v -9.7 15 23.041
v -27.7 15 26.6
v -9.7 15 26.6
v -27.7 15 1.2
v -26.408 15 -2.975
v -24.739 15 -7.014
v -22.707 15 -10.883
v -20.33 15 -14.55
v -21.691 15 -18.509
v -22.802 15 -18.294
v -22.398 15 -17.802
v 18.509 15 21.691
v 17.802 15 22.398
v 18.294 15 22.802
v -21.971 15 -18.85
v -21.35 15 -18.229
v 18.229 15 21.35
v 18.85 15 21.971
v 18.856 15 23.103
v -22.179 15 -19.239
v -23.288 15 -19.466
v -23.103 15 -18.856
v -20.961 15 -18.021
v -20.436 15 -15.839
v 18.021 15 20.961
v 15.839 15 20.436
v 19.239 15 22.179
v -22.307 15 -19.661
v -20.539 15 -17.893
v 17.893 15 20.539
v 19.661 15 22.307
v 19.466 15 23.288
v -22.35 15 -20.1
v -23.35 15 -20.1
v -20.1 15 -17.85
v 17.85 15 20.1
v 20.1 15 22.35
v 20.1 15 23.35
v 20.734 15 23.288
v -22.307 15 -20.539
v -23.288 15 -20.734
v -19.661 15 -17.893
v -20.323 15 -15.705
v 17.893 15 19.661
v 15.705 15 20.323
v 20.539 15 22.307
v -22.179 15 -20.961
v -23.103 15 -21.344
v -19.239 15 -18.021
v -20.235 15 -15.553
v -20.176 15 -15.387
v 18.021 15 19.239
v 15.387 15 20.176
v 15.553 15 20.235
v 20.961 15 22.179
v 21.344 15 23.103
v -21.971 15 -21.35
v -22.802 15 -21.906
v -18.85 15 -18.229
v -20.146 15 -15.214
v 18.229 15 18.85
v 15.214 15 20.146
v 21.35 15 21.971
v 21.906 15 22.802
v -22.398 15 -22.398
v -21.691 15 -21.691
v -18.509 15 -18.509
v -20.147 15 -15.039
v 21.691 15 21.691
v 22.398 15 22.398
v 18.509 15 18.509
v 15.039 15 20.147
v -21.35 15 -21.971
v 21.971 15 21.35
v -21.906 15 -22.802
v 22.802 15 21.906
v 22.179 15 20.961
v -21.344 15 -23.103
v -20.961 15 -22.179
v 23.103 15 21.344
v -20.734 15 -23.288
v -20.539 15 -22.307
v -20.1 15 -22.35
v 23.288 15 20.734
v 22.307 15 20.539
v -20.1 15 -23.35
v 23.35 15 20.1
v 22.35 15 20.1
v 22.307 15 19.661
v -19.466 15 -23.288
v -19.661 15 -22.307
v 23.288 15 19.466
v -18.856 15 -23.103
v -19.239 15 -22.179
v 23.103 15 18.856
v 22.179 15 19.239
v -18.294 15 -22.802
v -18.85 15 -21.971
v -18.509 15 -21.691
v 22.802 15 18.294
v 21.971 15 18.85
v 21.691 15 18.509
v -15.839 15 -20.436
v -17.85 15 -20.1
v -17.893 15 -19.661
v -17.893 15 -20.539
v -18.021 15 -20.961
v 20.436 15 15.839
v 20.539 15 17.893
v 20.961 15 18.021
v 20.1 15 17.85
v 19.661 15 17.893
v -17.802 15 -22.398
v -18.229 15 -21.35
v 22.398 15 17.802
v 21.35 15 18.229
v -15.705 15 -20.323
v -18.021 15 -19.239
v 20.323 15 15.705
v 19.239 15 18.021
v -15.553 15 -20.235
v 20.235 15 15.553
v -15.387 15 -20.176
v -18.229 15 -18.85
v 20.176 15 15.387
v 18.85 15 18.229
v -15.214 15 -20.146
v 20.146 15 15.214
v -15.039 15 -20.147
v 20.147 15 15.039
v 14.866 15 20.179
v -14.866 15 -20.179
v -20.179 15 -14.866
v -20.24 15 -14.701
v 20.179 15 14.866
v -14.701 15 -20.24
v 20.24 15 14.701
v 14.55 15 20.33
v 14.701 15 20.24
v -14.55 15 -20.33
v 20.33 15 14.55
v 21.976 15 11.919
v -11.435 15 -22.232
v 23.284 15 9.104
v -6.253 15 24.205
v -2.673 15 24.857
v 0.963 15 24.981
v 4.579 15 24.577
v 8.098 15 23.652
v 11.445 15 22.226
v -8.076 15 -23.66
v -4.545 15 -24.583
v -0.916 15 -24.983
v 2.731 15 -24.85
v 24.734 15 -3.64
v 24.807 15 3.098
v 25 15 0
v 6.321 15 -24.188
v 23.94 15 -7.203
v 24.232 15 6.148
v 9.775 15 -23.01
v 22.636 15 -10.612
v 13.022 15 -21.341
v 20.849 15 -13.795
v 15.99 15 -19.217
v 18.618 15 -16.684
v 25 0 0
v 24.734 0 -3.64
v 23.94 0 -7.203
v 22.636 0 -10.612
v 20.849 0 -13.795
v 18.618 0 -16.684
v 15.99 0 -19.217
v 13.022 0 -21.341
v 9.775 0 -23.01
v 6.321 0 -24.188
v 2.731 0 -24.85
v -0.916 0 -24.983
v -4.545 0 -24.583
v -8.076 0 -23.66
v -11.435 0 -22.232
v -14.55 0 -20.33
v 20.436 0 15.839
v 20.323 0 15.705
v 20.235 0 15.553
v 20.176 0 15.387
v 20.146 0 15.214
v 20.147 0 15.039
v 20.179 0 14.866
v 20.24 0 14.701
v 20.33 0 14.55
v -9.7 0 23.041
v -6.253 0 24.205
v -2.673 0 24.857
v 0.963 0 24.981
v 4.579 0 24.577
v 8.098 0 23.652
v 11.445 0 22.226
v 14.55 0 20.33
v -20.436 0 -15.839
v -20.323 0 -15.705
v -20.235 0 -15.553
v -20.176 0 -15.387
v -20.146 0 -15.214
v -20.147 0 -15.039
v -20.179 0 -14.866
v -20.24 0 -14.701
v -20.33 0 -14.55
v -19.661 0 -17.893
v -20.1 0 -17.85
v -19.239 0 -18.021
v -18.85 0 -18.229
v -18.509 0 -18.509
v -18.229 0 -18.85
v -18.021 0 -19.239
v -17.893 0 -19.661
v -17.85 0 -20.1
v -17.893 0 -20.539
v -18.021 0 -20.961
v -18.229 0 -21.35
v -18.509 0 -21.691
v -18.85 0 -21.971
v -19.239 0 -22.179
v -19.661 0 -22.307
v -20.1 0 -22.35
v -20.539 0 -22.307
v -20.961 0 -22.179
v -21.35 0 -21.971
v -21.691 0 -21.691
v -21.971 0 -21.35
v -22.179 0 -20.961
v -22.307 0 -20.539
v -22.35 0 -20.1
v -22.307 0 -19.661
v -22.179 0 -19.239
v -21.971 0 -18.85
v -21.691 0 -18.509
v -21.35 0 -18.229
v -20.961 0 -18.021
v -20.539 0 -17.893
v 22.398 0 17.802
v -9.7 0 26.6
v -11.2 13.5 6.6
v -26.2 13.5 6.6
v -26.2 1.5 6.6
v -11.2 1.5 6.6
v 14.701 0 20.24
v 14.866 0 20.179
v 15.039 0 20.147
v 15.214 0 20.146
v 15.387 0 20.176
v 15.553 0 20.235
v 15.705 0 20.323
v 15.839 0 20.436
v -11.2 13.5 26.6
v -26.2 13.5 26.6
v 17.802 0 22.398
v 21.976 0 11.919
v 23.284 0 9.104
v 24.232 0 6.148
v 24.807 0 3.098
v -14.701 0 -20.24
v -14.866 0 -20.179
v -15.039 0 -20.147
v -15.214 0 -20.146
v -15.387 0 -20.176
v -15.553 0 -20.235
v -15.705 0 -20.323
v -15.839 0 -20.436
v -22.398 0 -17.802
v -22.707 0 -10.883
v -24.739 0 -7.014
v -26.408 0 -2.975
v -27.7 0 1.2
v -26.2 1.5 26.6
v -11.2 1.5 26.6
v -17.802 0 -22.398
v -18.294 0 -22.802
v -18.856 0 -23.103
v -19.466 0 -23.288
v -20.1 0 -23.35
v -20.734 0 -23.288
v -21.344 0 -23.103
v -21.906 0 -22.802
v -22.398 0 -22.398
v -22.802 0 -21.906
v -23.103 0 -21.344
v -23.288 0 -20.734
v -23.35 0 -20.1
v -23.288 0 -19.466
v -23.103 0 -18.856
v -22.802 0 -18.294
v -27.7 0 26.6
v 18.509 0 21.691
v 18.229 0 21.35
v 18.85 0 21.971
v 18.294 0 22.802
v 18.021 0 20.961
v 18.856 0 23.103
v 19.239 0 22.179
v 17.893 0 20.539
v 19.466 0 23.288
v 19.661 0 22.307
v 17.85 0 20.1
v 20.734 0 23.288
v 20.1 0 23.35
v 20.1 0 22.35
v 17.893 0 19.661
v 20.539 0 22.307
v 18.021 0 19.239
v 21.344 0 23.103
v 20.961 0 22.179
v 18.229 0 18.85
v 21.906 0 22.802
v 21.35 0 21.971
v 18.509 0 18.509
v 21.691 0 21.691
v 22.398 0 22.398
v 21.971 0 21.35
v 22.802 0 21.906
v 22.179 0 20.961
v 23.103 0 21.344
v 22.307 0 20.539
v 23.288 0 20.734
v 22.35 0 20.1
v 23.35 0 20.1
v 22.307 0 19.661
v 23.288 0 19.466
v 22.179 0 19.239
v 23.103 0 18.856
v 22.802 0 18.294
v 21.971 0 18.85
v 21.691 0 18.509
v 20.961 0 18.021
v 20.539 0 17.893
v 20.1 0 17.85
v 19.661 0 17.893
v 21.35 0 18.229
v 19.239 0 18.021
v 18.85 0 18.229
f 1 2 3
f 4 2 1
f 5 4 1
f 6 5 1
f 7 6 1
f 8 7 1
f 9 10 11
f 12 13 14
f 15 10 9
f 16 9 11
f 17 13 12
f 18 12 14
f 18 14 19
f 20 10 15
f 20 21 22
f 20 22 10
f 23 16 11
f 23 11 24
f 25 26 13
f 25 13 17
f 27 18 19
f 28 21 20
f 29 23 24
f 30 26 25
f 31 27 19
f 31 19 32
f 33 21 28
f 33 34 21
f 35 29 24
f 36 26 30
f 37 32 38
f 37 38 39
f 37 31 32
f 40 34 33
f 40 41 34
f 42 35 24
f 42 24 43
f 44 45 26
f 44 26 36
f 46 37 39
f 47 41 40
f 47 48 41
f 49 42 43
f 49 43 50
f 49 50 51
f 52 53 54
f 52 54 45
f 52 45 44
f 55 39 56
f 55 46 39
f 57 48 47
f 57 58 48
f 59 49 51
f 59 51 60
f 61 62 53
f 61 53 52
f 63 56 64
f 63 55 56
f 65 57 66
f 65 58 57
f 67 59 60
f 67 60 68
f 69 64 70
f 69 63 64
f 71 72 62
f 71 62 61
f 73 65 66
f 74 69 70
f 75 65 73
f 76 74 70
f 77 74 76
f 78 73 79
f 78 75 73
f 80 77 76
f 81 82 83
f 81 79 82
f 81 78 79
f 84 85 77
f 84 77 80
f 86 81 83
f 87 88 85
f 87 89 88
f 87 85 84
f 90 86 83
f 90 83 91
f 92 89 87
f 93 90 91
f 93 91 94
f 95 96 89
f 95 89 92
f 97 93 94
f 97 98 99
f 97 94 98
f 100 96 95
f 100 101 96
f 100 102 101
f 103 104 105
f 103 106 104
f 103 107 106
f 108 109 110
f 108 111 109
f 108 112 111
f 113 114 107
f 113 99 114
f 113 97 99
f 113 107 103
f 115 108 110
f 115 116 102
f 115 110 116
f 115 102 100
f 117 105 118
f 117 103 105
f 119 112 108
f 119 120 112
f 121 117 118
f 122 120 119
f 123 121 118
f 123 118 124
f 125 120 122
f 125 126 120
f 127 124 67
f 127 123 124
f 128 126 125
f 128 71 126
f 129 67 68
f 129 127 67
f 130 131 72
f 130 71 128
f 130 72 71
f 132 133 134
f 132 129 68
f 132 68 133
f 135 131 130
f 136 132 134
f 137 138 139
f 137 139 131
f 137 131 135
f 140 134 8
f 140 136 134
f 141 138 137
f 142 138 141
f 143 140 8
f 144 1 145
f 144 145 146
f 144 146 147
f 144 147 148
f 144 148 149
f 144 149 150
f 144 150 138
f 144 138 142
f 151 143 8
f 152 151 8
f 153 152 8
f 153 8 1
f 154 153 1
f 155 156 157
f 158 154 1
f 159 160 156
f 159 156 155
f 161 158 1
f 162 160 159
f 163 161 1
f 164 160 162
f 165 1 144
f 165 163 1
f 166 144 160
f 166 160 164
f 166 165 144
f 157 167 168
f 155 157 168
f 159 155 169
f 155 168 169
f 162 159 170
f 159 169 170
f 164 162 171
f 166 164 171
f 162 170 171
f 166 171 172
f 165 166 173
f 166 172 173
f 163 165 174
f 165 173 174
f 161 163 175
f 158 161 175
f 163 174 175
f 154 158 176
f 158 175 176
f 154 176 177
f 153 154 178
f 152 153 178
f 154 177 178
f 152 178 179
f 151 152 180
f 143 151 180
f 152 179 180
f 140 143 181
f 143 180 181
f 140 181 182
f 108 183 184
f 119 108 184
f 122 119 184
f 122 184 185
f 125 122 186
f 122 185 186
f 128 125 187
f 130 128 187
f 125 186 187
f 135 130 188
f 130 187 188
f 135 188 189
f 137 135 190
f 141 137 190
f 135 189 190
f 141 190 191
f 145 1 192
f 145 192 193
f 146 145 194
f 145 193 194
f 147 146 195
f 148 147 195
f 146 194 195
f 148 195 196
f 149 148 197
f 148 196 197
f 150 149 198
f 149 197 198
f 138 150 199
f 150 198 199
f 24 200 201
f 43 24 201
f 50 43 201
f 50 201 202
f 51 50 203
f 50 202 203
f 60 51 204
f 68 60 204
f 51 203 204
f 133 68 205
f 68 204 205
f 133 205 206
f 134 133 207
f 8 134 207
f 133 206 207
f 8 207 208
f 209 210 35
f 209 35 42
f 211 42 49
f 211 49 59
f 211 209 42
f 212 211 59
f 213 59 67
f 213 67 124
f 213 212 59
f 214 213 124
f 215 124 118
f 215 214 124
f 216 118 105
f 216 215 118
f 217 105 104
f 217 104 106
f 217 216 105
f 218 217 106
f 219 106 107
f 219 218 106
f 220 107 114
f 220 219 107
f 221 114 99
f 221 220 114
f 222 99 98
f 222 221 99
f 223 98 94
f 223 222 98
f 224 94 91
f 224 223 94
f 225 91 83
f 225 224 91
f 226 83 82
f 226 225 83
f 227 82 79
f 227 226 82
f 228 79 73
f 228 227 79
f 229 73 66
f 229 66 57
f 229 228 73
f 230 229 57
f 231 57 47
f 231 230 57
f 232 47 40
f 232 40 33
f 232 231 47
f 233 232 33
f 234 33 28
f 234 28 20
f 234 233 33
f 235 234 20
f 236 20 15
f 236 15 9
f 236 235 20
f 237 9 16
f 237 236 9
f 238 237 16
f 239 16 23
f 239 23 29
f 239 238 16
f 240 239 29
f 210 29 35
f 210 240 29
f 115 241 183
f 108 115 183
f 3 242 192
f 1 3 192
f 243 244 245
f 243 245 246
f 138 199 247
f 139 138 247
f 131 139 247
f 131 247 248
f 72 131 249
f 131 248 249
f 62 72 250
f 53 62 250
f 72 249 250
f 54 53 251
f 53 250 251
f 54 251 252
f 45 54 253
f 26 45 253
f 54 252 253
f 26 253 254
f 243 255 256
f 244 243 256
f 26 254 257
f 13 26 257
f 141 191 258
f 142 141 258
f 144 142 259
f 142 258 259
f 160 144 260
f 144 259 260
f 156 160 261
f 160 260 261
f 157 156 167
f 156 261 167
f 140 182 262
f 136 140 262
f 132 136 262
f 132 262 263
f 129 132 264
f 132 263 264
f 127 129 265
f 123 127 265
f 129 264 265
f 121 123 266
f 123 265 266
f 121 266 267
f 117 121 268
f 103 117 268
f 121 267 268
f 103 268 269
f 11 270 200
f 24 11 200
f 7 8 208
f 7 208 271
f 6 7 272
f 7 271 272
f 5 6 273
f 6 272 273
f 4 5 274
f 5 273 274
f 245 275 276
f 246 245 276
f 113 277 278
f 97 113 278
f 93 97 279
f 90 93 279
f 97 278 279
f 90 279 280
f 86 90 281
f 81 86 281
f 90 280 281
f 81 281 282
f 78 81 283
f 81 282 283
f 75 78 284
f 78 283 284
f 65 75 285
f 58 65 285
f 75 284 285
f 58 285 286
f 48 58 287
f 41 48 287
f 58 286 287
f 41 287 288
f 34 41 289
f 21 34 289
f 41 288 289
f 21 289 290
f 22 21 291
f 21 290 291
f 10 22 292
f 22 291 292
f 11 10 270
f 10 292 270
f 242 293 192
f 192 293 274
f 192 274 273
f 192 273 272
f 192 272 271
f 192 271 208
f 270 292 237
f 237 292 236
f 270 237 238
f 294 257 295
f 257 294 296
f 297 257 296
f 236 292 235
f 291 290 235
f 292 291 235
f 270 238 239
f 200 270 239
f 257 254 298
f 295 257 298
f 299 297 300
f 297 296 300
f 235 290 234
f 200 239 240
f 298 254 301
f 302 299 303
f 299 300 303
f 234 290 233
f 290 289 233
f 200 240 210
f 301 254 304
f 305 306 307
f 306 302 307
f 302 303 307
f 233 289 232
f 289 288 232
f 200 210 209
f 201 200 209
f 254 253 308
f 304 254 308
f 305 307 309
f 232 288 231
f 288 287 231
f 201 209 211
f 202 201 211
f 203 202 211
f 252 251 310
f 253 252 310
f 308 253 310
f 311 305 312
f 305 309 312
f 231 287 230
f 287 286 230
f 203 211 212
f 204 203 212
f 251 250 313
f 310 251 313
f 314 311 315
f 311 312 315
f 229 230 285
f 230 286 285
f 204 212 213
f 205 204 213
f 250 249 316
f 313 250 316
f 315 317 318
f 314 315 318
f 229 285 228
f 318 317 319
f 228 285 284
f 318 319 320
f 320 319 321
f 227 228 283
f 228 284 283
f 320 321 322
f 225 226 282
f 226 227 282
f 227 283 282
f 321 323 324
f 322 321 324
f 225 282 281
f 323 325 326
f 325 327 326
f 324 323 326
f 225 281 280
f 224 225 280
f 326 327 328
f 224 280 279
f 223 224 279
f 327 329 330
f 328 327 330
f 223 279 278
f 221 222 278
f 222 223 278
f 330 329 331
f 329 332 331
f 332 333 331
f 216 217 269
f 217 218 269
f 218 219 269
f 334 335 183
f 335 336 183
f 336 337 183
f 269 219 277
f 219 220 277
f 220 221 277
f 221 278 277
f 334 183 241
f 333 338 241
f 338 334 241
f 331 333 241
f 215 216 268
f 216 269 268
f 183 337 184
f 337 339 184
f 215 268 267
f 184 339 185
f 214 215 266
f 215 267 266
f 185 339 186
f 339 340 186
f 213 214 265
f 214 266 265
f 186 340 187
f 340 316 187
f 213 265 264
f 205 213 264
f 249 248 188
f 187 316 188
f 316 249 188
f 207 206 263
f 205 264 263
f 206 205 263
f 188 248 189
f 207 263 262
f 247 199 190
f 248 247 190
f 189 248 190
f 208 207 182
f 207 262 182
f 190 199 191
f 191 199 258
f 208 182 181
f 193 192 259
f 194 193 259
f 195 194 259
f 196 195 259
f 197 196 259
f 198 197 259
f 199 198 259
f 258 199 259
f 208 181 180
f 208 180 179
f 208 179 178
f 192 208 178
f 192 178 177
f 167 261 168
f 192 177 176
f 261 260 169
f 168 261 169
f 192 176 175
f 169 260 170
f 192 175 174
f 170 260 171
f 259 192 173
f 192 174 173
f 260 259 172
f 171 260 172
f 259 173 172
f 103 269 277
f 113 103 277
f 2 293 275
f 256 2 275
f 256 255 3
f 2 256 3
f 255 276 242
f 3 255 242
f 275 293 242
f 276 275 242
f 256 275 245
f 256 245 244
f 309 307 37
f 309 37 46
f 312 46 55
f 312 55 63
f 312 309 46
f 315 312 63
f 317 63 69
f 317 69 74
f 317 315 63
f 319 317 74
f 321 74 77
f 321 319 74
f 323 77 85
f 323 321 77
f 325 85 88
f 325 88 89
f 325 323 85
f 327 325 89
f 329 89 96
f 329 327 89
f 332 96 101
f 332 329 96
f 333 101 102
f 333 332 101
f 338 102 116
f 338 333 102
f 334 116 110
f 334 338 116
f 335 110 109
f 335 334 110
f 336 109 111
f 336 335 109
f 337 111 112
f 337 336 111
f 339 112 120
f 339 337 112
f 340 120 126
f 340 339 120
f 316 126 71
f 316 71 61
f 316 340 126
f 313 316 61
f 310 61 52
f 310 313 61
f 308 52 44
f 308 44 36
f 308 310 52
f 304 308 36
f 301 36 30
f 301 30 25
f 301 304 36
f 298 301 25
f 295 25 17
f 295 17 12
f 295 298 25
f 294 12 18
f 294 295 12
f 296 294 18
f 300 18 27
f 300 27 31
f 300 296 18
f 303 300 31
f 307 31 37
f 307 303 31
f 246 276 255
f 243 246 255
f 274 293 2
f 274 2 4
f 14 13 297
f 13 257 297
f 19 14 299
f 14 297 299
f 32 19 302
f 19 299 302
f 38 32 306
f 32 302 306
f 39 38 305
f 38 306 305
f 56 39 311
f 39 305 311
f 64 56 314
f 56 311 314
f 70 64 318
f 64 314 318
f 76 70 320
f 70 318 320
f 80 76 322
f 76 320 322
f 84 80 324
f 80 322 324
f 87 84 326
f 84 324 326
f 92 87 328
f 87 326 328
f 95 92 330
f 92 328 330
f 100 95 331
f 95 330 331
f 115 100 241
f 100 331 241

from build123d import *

# Parameters (mm, degrees)
SKETCH1_R            = 2.25
BOSS_EXTRUDE1_DEPTH  = 15
SKETCH2_W            = 15
SKETCH2_H            = 12
BLOWER_OPENING_DEPTH = 20


with BuildPart() as part:
    # Sketch1 → Boss-Extrude1 (new body)
    with BuildSketch(Plane(origin=(0, 0, 0), x_dir=(1, 0, 0), z_dir=(0, 1, 0))):
        with BuildLine():
            ThreePointArc((-20.329518762, 14.550280647), (-24.739386117, 7.014235726), (-27.7, -1.2))
            Line((-27.7, -1.2), (-27.7, -26.6))
            Line((-27.7, -26.6), (-9.7, -26.6))
            Line((-9.7, -26.6), (-9.7, -23.041484327))
            ThreePointArc((-9.7, -23.041484327), (2.778487879, -24.845120348), (14.550280647, -20.329518762))
            ThreePointArc((14.550280647, -20.329518762), (15.214298861, -20.146067758), (15.839398654, -20.435592731))
            Line((15.839398654, -20.435592731), (17.801902961, -22.398097039))
            ThreePointArc((17.801902961, -22.398097039), (22.398097039, -22.398097039), (22.398097039, -17.801902961))
            Line((22.398097039, -17.801902961), (20.435592731, -15.839398654))
            ThreePointArc((20.435592731, -15.839398654), (20.146067758, -15.214298861), (20.329518762, -14.550280647))
            ThreePointArc((20.329518762, -14.550280647), (17.67766953, 17.67766953), (-14.550280647, 20.329518762))
            ThreePointArc((-14.550280647, 20.329518762), (-15.214298861, 20.146067758), (-15.839398654, 20.435592731))
            Line((-15.839398654, 20.435592731), (-17.801902961, 22.398097039))
            ThreePointArc((-17.801902961, 22.398097039), (-22.398097039, 22.398097039), (-22.398097039, 17.801902961))
            Line((-22.398097039, 17.801902961), (-20.435592731, 15.839398654))
            ThreePointArc((-20.435592731, 15.839398654), (-20.146067758, 15.214298861), (-20.329518762, 14.550280647))
        make_face()
        with Locations((-20.1, 20.1)):
            Circle(SKETCH1_R, mode=Mode.SUBTRACT)
        with Locations((20.1, -20.1)):
            Circle(SKETCH1_R, mode=Mode.SUBTRACT)
    extrude(amount=BOSS_EXTRUDE1_DEPTH)

    # Sketch2 → blower opening (cut)
    with BuildSketch(Plane.XY.offset(26.6)):
        with Locations((-18.7, 7.5)):
            Rectangle(SKETCH2_W, SKETCH2_H)
    extrude(amount=-BLOWER_OPENING_DEPTH, mode=Mode.SUBTRACT)


solid = part.part
